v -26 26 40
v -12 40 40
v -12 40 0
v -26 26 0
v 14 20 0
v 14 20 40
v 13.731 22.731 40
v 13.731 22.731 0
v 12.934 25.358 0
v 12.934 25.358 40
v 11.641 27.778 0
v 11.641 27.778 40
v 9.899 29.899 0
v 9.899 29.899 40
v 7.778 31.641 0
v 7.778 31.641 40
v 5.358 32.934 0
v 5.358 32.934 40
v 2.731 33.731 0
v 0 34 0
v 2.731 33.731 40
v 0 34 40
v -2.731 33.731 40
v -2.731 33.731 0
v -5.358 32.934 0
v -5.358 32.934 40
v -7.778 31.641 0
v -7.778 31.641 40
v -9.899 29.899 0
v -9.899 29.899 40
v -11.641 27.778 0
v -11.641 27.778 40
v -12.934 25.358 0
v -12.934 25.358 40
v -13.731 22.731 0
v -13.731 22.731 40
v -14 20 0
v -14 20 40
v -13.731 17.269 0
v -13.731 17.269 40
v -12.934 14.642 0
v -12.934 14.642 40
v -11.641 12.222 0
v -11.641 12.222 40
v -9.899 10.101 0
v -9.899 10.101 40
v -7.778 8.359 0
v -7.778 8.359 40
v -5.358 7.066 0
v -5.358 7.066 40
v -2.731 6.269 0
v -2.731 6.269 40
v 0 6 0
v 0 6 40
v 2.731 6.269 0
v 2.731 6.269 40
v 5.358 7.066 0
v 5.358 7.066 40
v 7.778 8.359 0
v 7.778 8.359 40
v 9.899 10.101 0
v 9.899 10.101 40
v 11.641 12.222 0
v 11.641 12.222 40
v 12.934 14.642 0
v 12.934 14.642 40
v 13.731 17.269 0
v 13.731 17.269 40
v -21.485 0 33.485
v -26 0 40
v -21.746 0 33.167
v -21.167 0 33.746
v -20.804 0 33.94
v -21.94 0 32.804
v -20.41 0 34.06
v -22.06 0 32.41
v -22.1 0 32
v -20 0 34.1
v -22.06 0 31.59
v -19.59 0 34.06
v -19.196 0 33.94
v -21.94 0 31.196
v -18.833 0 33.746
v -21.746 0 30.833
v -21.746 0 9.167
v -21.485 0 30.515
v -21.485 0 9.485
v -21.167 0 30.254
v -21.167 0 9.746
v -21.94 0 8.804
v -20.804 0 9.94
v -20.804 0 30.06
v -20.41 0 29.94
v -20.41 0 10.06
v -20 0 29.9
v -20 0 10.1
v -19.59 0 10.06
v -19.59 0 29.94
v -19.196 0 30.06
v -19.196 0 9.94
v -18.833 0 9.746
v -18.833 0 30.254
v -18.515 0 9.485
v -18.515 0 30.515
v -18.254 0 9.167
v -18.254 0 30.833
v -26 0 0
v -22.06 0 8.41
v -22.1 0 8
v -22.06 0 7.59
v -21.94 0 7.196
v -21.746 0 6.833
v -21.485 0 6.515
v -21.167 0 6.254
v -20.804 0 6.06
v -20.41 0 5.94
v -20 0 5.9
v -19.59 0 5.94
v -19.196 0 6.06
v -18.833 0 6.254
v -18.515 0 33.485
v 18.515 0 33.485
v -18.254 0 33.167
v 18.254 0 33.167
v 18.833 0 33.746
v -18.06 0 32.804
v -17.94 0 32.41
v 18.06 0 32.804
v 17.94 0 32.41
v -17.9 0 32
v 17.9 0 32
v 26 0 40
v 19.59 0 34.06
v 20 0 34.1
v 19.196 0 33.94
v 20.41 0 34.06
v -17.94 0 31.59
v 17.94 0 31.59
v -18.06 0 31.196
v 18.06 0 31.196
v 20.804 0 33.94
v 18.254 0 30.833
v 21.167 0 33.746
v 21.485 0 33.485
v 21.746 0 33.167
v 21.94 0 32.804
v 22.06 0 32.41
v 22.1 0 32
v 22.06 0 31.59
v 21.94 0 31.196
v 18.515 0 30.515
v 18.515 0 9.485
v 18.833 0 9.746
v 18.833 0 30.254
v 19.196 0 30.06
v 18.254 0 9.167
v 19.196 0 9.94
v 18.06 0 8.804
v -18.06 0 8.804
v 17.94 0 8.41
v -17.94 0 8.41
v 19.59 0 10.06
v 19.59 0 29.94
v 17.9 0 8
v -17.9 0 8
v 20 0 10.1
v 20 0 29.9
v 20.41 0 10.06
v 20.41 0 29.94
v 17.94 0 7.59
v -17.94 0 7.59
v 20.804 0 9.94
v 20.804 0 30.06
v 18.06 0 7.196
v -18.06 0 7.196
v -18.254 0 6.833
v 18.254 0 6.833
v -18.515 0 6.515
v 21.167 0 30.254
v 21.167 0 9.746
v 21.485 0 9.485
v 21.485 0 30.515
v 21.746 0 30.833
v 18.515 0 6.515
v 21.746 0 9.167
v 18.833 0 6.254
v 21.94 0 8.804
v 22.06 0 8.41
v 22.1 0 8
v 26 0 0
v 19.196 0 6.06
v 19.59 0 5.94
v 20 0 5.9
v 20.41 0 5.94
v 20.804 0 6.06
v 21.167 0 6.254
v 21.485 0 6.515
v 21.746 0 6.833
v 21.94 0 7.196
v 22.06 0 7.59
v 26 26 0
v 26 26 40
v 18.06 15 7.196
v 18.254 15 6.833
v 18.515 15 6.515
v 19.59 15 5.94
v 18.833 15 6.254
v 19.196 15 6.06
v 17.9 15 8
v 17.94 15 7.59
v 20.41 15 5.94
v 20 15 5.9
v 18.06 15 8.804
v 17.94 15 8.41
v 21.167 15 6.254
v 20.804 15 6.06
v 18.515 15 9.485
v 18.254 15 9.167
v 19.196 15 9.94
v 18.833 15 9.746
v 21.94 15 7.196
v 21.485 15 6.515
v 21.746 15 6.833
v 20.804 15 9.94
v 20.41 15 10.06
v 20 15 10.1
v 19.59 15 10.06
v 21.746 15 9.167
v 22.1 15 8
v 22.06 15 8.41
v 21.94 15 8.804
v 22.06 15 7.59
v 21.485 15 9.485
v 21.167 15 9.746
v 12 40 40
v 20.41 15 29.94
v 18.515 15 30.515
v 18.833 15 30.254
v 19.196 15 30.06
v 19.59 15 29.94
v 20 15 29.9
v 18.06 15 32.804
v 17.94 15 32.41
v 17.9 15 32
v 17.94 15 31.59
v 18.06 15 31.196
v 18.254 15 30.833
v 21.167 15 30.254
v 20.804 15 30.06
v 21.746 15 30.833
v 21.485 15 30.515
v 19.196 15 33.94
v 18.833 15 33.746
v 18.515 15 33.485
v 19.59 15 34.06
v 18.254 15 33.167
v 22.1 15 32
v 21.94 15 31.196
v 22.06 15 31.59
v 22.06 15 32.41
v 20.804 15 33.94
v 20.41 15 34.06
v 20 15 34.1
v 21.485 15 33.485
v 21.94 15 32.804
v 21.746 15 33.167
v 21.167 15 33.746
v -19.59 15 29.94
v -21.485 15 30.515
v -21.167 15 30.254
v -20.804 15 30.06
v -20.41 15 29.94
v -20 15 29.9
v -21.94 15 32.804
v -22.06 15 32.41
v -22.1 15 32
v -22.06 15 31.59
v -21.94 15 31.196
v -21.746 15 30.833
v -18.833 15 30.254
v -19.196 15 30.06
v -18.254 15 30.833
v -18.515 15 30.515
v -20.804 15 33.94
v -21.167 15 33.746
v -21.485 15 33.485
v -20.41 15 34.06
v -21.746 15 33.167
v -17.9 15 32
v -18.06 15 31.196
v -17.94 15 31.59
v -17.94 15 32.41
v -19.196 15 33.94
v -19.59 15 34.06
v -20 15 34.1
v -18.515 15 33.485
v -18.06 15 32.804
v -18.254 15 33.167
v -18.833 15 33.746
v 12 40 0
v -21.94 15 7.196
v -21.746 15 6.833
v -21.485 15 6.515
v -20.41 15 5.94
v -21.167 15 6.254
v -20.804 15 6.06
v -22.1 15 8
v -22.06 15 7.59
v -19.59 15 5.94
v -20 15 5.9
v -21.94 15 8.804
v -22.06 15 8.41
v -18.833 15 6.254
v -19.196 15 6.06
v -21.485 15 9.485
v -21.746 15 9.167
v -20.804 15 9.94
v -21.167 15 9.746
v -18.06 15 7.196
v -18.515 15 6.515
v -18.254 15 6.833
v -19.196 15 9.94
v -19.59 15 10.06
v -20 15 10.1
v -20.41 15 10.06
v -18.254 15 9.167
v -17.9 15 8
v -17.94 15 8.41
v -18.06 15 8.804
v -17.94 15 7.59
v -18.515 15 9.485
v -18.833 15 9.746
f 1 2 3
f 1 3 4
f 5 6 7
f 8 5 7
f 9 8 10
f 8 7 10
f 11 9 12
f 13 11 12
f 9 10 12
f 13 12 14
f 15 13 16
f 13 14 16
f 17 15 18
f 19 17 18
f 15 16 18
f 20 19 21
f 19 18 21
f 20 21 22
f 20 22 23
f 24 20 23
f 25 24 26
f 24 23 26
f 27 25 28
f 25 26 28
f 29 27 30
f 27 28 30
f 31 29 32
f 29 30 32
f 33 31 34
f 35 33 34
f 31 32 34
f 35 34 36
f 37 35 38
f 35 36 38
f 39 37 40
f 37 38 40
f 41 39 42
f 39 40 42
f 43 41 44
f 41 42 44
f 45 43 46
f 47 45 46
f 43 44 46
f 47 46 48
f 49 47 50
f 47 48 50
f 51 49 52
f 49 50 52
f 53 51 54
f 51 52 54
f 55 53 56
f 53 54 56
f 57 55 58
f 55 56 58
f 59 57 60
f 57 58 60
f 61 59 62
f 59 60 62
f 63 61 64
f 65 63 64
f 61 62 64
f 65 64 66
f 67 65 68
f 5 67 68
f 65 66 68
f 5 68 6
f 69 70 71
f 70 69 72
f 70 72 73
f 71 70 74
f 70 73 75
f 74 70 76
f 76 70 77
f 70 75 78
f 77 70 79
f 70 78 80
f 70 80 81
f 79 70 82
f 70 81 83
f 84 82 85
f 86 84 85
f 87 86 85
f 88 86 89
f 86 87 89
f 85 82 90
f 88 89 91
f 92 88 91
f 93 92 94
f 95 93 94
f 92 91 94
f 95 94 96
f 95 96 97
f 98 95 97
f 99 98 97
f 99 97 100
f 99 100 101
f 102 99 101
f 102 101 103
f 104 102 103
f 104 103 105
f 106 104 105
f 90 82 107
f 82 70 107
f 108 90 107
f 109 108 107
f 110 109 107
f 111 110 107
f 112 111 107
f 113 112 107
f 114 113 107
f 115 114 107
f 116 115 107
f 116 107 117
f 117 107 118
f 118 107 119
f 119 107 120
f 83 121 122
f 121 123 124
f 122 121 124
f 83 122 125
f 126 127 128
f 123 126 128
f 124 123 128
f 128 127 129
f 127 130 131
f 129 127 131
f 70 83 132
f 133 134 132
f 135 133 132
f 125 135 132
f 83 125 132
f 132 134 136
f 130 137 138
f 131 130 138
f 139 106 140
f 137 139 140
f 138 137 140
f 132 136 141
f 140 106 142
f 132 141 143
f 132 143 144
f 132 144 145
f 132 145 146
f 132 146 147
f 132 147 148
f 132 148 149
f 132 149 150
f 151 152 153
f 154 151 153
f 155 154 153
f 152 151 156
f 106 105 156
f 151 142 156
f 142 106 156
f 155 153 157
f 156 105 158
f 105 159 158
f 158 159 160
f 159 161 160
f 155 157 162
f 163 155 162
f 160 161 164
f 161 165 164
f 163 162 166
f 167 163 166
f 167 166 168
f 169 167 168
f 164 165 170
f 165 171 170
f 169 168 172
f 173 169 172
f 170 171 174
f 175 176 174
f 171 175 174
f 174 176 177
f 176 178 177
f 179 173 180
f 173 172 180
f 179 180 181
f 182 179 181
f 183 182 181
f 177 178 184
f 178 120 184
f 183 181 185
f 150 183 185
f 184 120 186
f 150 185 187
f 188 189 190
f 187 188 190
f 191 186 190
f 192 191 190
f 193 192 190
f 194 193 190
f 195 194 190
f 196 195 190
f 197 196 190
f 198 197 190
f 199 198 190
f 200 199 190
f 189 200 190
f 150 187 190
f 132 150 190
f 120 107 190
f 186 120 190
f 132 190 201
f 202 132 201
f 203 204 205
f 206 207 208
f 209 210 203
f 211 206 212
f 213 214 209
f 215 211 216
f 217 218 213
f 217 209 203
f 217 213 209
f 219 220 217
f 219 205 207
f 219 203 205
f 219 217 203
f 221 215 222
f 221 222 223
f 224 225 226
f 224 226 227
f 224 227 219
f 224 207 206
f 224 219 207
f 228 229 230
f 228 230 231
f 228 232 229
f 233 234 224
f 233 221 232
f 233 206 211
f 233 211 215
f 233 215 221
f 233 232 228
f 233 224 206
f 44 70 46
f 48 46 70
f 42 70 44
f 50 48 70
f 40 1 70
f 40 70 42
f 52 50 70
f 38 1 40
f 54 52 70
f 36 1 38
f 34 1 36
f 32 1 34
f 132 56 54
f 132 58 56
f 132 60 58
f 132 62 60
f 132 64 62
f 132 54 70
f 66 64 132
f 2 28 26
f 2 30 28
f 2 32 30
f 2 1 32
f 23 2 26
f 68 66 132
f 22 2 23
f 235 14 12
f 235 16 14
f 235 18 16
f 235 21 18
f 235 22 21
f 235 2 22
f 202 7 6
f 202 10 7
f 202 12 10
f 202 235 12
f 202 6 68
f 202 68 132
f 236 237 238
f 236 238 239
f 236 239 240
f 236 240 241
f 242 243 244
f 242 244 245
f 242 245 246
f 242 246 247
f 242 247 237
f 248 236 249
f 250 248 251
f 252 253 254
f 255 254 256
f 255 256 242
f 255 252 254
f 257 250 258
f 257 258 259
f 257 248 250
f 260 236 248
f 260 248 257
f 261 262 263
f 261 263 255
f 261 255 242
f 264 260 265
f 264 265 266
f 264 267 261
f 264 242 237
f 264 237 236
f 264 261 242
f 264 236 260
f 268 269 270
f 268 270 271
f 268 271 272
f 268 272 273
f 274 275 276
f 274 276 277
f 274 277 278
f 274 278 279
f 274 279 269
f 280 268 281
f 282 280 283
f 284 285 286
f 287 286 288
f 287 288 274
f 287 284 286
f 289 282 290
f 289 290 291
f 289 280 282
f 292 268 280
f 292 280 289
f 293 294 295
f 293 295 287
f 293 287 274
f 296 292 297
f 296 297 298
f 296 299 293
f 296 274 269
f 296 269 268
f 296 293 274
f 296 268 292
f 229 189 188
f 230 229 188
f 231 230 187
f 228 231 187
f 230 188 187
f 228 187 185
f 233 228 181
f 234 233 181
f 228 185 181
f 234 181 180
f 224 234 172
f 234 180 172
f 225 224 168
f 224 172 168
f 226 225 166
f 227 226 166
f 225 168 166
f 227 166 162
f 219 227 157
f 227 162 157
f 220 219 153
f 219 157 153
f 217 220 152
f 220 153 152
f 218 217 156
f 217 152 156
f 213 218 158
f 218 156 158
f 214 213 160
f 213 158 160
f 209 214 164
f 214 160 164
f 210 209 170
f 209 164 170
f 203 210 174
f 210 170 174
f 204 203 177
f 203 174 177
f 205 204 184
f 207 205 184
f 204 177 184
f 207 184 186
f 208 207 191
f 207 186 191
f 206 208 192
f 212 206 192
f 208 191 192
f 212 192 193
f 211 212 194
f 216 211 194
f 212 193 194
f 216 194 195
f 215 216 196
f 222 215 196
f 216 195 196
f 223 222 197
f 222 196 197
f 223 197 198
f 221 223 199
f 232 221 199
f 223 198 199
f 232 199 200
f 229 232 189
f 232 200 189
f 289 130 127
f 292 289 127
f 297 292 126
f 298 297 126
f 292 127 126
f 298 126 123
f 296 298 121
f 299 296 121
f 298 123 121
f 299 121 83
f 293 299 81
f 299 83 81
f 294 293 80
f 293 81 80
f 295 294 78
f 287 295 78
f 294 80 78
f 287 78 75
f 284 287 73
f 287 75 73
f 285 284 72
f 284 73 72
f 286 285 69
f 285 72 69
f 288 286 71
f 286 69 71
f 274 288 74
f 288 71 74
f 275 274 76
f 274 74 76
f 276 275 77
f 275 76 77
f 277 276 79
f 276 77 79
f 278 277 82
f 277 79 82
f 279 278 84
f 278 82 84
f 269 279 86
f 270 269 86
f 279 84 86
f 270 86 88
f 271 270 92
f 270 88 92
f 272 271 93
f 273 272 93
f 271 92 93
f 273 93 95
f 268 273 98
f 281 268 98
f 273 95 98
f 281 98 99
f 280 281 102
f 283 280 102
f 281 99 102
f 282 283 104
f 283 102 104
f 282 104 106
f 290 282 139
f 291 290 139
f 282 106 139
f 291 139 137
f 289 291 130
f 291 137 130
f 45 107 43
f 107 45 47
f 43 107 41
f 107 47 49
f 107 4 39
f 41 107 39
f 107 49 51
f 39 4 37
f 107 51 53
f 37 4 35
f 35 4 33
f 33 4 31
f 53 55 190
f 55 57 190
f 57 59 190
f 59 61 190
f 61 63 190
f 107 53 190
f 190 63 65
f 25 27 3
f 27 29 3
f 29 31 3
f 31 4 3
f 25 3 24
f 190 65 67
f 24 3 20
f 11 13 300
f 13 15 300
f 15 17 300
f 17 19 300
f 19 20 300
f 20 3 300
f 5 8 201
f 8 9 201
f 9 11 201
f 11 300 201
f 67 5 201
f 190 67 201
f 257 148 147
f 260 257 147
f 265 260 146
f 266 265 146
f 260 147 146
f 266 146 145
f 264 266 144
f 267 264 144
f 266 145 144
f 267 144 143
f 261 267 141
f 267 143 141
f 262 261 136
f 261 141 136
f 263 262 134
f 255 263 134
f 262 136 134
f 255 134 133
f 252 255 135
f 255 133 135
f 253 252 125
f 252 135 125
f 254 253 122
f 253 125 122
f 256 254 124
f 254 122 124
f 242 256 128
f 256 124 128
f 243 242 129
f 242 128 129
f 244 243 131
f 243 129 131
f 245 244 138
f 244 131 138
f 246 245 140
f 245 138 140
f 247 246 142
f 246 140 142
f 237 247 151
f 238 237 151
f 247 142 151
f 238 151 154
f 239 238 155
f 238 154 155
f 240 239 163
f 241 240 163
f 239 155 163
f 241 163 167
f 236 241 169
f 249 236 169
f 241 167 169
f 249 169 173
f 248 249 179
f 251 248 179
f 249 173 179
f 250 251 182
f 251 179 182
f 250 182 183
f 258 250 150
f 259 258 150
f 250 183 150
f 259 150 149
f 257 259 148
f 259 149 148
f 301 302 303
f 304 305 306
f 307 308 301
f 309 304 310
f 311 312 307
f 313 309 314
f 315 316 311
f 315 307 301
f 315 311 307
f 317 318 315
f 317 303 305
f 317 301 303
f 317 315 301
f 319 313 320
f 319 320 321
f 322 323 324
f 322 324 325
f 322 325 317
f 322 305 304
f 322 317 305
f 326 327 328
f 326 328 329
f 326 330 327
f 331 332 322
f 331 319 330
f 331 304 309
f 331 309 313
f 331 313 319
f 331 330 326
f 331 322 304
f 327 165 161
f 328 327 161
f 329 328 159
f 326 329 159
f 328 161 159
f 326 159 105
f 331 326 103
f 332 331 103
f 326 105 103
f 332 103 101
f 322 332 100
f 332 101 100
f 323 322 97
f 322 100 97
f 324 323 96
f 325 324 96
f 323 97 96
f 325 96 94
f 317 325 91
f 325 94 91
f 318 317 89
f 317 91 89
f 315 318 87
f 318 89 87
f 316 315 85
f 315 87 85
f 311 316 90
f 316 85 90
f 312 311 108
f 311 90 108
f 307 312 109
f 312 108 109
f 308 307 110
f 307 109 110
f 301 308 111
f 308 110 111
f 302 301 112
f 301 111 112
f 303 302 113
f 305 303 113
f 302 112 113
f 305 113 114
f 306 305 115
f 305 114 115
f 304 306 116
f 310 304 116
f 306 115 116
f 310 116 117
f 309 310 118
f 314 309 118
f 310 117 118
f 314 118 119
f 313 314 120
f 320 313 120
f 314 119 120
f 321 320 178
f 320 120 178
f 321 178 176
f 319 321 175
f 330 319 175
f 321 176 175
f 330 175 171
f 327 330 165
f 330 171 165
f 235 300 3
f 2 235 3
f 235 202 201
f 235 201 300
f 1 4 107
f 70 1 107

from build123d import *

# Parameters (mm, degrees)
AUFSATZ_LINEAR_AUSTRAGEN1_DEPTH = 40
SKIZZE2_R                       = 14
SCHNITT_LINEAR_AUSTRAGEN1_DEPTH = 40
SKIZZE3_R                       = 2.1
SCHNITT_LINEAR_AUSTRAGEN2_DEPTH = 15


with BuildPart() as part:
    # Skizze1 → Aufsatz-Linear austragen1 (new body)
    with BuildSketch(Plane.XY):
        Polygon((-26, 0), (26, 0), (26, 26), (12, 40), (-12, 40), (-26, 26), align=None)
    extrude(amount=AUFSATZ_LINEAR_AUSTRAGEN1_DEPTH)

    # Skizze2 → Schnitt-Linear austragen1 (cut)
    with BuildSketch(Plane.XY.offset(40)):
        with Locations((0, 20)):
            Circle(SKIZZE2_R)
    extrude(amount=-SCHNITT_LINEAR_AUSTRAGEN1_DEPTH, mode=Mode.SUBTRACT)

    # Skizze3 → Schnitt-Linear austragen2 (cut)
    with BuildSketch(Plane.XZ):
        with Locations((-20, 32)):
            Circle(SKIZZE3_R)
        with Locations((20, 32)):
            Circle(SKIZZE3_R)
        with Locations((-20, 8)):
            Circle(SKIZZE3_R)
        with Locations((20, 8)):
            Circle(SKIZZE3_R)
    extrude(amount=-SCHNITT_LINEAR_AUSTRAGEN2_DEPTH, mode=Mode.SUBTRACT)


solid = part.part
